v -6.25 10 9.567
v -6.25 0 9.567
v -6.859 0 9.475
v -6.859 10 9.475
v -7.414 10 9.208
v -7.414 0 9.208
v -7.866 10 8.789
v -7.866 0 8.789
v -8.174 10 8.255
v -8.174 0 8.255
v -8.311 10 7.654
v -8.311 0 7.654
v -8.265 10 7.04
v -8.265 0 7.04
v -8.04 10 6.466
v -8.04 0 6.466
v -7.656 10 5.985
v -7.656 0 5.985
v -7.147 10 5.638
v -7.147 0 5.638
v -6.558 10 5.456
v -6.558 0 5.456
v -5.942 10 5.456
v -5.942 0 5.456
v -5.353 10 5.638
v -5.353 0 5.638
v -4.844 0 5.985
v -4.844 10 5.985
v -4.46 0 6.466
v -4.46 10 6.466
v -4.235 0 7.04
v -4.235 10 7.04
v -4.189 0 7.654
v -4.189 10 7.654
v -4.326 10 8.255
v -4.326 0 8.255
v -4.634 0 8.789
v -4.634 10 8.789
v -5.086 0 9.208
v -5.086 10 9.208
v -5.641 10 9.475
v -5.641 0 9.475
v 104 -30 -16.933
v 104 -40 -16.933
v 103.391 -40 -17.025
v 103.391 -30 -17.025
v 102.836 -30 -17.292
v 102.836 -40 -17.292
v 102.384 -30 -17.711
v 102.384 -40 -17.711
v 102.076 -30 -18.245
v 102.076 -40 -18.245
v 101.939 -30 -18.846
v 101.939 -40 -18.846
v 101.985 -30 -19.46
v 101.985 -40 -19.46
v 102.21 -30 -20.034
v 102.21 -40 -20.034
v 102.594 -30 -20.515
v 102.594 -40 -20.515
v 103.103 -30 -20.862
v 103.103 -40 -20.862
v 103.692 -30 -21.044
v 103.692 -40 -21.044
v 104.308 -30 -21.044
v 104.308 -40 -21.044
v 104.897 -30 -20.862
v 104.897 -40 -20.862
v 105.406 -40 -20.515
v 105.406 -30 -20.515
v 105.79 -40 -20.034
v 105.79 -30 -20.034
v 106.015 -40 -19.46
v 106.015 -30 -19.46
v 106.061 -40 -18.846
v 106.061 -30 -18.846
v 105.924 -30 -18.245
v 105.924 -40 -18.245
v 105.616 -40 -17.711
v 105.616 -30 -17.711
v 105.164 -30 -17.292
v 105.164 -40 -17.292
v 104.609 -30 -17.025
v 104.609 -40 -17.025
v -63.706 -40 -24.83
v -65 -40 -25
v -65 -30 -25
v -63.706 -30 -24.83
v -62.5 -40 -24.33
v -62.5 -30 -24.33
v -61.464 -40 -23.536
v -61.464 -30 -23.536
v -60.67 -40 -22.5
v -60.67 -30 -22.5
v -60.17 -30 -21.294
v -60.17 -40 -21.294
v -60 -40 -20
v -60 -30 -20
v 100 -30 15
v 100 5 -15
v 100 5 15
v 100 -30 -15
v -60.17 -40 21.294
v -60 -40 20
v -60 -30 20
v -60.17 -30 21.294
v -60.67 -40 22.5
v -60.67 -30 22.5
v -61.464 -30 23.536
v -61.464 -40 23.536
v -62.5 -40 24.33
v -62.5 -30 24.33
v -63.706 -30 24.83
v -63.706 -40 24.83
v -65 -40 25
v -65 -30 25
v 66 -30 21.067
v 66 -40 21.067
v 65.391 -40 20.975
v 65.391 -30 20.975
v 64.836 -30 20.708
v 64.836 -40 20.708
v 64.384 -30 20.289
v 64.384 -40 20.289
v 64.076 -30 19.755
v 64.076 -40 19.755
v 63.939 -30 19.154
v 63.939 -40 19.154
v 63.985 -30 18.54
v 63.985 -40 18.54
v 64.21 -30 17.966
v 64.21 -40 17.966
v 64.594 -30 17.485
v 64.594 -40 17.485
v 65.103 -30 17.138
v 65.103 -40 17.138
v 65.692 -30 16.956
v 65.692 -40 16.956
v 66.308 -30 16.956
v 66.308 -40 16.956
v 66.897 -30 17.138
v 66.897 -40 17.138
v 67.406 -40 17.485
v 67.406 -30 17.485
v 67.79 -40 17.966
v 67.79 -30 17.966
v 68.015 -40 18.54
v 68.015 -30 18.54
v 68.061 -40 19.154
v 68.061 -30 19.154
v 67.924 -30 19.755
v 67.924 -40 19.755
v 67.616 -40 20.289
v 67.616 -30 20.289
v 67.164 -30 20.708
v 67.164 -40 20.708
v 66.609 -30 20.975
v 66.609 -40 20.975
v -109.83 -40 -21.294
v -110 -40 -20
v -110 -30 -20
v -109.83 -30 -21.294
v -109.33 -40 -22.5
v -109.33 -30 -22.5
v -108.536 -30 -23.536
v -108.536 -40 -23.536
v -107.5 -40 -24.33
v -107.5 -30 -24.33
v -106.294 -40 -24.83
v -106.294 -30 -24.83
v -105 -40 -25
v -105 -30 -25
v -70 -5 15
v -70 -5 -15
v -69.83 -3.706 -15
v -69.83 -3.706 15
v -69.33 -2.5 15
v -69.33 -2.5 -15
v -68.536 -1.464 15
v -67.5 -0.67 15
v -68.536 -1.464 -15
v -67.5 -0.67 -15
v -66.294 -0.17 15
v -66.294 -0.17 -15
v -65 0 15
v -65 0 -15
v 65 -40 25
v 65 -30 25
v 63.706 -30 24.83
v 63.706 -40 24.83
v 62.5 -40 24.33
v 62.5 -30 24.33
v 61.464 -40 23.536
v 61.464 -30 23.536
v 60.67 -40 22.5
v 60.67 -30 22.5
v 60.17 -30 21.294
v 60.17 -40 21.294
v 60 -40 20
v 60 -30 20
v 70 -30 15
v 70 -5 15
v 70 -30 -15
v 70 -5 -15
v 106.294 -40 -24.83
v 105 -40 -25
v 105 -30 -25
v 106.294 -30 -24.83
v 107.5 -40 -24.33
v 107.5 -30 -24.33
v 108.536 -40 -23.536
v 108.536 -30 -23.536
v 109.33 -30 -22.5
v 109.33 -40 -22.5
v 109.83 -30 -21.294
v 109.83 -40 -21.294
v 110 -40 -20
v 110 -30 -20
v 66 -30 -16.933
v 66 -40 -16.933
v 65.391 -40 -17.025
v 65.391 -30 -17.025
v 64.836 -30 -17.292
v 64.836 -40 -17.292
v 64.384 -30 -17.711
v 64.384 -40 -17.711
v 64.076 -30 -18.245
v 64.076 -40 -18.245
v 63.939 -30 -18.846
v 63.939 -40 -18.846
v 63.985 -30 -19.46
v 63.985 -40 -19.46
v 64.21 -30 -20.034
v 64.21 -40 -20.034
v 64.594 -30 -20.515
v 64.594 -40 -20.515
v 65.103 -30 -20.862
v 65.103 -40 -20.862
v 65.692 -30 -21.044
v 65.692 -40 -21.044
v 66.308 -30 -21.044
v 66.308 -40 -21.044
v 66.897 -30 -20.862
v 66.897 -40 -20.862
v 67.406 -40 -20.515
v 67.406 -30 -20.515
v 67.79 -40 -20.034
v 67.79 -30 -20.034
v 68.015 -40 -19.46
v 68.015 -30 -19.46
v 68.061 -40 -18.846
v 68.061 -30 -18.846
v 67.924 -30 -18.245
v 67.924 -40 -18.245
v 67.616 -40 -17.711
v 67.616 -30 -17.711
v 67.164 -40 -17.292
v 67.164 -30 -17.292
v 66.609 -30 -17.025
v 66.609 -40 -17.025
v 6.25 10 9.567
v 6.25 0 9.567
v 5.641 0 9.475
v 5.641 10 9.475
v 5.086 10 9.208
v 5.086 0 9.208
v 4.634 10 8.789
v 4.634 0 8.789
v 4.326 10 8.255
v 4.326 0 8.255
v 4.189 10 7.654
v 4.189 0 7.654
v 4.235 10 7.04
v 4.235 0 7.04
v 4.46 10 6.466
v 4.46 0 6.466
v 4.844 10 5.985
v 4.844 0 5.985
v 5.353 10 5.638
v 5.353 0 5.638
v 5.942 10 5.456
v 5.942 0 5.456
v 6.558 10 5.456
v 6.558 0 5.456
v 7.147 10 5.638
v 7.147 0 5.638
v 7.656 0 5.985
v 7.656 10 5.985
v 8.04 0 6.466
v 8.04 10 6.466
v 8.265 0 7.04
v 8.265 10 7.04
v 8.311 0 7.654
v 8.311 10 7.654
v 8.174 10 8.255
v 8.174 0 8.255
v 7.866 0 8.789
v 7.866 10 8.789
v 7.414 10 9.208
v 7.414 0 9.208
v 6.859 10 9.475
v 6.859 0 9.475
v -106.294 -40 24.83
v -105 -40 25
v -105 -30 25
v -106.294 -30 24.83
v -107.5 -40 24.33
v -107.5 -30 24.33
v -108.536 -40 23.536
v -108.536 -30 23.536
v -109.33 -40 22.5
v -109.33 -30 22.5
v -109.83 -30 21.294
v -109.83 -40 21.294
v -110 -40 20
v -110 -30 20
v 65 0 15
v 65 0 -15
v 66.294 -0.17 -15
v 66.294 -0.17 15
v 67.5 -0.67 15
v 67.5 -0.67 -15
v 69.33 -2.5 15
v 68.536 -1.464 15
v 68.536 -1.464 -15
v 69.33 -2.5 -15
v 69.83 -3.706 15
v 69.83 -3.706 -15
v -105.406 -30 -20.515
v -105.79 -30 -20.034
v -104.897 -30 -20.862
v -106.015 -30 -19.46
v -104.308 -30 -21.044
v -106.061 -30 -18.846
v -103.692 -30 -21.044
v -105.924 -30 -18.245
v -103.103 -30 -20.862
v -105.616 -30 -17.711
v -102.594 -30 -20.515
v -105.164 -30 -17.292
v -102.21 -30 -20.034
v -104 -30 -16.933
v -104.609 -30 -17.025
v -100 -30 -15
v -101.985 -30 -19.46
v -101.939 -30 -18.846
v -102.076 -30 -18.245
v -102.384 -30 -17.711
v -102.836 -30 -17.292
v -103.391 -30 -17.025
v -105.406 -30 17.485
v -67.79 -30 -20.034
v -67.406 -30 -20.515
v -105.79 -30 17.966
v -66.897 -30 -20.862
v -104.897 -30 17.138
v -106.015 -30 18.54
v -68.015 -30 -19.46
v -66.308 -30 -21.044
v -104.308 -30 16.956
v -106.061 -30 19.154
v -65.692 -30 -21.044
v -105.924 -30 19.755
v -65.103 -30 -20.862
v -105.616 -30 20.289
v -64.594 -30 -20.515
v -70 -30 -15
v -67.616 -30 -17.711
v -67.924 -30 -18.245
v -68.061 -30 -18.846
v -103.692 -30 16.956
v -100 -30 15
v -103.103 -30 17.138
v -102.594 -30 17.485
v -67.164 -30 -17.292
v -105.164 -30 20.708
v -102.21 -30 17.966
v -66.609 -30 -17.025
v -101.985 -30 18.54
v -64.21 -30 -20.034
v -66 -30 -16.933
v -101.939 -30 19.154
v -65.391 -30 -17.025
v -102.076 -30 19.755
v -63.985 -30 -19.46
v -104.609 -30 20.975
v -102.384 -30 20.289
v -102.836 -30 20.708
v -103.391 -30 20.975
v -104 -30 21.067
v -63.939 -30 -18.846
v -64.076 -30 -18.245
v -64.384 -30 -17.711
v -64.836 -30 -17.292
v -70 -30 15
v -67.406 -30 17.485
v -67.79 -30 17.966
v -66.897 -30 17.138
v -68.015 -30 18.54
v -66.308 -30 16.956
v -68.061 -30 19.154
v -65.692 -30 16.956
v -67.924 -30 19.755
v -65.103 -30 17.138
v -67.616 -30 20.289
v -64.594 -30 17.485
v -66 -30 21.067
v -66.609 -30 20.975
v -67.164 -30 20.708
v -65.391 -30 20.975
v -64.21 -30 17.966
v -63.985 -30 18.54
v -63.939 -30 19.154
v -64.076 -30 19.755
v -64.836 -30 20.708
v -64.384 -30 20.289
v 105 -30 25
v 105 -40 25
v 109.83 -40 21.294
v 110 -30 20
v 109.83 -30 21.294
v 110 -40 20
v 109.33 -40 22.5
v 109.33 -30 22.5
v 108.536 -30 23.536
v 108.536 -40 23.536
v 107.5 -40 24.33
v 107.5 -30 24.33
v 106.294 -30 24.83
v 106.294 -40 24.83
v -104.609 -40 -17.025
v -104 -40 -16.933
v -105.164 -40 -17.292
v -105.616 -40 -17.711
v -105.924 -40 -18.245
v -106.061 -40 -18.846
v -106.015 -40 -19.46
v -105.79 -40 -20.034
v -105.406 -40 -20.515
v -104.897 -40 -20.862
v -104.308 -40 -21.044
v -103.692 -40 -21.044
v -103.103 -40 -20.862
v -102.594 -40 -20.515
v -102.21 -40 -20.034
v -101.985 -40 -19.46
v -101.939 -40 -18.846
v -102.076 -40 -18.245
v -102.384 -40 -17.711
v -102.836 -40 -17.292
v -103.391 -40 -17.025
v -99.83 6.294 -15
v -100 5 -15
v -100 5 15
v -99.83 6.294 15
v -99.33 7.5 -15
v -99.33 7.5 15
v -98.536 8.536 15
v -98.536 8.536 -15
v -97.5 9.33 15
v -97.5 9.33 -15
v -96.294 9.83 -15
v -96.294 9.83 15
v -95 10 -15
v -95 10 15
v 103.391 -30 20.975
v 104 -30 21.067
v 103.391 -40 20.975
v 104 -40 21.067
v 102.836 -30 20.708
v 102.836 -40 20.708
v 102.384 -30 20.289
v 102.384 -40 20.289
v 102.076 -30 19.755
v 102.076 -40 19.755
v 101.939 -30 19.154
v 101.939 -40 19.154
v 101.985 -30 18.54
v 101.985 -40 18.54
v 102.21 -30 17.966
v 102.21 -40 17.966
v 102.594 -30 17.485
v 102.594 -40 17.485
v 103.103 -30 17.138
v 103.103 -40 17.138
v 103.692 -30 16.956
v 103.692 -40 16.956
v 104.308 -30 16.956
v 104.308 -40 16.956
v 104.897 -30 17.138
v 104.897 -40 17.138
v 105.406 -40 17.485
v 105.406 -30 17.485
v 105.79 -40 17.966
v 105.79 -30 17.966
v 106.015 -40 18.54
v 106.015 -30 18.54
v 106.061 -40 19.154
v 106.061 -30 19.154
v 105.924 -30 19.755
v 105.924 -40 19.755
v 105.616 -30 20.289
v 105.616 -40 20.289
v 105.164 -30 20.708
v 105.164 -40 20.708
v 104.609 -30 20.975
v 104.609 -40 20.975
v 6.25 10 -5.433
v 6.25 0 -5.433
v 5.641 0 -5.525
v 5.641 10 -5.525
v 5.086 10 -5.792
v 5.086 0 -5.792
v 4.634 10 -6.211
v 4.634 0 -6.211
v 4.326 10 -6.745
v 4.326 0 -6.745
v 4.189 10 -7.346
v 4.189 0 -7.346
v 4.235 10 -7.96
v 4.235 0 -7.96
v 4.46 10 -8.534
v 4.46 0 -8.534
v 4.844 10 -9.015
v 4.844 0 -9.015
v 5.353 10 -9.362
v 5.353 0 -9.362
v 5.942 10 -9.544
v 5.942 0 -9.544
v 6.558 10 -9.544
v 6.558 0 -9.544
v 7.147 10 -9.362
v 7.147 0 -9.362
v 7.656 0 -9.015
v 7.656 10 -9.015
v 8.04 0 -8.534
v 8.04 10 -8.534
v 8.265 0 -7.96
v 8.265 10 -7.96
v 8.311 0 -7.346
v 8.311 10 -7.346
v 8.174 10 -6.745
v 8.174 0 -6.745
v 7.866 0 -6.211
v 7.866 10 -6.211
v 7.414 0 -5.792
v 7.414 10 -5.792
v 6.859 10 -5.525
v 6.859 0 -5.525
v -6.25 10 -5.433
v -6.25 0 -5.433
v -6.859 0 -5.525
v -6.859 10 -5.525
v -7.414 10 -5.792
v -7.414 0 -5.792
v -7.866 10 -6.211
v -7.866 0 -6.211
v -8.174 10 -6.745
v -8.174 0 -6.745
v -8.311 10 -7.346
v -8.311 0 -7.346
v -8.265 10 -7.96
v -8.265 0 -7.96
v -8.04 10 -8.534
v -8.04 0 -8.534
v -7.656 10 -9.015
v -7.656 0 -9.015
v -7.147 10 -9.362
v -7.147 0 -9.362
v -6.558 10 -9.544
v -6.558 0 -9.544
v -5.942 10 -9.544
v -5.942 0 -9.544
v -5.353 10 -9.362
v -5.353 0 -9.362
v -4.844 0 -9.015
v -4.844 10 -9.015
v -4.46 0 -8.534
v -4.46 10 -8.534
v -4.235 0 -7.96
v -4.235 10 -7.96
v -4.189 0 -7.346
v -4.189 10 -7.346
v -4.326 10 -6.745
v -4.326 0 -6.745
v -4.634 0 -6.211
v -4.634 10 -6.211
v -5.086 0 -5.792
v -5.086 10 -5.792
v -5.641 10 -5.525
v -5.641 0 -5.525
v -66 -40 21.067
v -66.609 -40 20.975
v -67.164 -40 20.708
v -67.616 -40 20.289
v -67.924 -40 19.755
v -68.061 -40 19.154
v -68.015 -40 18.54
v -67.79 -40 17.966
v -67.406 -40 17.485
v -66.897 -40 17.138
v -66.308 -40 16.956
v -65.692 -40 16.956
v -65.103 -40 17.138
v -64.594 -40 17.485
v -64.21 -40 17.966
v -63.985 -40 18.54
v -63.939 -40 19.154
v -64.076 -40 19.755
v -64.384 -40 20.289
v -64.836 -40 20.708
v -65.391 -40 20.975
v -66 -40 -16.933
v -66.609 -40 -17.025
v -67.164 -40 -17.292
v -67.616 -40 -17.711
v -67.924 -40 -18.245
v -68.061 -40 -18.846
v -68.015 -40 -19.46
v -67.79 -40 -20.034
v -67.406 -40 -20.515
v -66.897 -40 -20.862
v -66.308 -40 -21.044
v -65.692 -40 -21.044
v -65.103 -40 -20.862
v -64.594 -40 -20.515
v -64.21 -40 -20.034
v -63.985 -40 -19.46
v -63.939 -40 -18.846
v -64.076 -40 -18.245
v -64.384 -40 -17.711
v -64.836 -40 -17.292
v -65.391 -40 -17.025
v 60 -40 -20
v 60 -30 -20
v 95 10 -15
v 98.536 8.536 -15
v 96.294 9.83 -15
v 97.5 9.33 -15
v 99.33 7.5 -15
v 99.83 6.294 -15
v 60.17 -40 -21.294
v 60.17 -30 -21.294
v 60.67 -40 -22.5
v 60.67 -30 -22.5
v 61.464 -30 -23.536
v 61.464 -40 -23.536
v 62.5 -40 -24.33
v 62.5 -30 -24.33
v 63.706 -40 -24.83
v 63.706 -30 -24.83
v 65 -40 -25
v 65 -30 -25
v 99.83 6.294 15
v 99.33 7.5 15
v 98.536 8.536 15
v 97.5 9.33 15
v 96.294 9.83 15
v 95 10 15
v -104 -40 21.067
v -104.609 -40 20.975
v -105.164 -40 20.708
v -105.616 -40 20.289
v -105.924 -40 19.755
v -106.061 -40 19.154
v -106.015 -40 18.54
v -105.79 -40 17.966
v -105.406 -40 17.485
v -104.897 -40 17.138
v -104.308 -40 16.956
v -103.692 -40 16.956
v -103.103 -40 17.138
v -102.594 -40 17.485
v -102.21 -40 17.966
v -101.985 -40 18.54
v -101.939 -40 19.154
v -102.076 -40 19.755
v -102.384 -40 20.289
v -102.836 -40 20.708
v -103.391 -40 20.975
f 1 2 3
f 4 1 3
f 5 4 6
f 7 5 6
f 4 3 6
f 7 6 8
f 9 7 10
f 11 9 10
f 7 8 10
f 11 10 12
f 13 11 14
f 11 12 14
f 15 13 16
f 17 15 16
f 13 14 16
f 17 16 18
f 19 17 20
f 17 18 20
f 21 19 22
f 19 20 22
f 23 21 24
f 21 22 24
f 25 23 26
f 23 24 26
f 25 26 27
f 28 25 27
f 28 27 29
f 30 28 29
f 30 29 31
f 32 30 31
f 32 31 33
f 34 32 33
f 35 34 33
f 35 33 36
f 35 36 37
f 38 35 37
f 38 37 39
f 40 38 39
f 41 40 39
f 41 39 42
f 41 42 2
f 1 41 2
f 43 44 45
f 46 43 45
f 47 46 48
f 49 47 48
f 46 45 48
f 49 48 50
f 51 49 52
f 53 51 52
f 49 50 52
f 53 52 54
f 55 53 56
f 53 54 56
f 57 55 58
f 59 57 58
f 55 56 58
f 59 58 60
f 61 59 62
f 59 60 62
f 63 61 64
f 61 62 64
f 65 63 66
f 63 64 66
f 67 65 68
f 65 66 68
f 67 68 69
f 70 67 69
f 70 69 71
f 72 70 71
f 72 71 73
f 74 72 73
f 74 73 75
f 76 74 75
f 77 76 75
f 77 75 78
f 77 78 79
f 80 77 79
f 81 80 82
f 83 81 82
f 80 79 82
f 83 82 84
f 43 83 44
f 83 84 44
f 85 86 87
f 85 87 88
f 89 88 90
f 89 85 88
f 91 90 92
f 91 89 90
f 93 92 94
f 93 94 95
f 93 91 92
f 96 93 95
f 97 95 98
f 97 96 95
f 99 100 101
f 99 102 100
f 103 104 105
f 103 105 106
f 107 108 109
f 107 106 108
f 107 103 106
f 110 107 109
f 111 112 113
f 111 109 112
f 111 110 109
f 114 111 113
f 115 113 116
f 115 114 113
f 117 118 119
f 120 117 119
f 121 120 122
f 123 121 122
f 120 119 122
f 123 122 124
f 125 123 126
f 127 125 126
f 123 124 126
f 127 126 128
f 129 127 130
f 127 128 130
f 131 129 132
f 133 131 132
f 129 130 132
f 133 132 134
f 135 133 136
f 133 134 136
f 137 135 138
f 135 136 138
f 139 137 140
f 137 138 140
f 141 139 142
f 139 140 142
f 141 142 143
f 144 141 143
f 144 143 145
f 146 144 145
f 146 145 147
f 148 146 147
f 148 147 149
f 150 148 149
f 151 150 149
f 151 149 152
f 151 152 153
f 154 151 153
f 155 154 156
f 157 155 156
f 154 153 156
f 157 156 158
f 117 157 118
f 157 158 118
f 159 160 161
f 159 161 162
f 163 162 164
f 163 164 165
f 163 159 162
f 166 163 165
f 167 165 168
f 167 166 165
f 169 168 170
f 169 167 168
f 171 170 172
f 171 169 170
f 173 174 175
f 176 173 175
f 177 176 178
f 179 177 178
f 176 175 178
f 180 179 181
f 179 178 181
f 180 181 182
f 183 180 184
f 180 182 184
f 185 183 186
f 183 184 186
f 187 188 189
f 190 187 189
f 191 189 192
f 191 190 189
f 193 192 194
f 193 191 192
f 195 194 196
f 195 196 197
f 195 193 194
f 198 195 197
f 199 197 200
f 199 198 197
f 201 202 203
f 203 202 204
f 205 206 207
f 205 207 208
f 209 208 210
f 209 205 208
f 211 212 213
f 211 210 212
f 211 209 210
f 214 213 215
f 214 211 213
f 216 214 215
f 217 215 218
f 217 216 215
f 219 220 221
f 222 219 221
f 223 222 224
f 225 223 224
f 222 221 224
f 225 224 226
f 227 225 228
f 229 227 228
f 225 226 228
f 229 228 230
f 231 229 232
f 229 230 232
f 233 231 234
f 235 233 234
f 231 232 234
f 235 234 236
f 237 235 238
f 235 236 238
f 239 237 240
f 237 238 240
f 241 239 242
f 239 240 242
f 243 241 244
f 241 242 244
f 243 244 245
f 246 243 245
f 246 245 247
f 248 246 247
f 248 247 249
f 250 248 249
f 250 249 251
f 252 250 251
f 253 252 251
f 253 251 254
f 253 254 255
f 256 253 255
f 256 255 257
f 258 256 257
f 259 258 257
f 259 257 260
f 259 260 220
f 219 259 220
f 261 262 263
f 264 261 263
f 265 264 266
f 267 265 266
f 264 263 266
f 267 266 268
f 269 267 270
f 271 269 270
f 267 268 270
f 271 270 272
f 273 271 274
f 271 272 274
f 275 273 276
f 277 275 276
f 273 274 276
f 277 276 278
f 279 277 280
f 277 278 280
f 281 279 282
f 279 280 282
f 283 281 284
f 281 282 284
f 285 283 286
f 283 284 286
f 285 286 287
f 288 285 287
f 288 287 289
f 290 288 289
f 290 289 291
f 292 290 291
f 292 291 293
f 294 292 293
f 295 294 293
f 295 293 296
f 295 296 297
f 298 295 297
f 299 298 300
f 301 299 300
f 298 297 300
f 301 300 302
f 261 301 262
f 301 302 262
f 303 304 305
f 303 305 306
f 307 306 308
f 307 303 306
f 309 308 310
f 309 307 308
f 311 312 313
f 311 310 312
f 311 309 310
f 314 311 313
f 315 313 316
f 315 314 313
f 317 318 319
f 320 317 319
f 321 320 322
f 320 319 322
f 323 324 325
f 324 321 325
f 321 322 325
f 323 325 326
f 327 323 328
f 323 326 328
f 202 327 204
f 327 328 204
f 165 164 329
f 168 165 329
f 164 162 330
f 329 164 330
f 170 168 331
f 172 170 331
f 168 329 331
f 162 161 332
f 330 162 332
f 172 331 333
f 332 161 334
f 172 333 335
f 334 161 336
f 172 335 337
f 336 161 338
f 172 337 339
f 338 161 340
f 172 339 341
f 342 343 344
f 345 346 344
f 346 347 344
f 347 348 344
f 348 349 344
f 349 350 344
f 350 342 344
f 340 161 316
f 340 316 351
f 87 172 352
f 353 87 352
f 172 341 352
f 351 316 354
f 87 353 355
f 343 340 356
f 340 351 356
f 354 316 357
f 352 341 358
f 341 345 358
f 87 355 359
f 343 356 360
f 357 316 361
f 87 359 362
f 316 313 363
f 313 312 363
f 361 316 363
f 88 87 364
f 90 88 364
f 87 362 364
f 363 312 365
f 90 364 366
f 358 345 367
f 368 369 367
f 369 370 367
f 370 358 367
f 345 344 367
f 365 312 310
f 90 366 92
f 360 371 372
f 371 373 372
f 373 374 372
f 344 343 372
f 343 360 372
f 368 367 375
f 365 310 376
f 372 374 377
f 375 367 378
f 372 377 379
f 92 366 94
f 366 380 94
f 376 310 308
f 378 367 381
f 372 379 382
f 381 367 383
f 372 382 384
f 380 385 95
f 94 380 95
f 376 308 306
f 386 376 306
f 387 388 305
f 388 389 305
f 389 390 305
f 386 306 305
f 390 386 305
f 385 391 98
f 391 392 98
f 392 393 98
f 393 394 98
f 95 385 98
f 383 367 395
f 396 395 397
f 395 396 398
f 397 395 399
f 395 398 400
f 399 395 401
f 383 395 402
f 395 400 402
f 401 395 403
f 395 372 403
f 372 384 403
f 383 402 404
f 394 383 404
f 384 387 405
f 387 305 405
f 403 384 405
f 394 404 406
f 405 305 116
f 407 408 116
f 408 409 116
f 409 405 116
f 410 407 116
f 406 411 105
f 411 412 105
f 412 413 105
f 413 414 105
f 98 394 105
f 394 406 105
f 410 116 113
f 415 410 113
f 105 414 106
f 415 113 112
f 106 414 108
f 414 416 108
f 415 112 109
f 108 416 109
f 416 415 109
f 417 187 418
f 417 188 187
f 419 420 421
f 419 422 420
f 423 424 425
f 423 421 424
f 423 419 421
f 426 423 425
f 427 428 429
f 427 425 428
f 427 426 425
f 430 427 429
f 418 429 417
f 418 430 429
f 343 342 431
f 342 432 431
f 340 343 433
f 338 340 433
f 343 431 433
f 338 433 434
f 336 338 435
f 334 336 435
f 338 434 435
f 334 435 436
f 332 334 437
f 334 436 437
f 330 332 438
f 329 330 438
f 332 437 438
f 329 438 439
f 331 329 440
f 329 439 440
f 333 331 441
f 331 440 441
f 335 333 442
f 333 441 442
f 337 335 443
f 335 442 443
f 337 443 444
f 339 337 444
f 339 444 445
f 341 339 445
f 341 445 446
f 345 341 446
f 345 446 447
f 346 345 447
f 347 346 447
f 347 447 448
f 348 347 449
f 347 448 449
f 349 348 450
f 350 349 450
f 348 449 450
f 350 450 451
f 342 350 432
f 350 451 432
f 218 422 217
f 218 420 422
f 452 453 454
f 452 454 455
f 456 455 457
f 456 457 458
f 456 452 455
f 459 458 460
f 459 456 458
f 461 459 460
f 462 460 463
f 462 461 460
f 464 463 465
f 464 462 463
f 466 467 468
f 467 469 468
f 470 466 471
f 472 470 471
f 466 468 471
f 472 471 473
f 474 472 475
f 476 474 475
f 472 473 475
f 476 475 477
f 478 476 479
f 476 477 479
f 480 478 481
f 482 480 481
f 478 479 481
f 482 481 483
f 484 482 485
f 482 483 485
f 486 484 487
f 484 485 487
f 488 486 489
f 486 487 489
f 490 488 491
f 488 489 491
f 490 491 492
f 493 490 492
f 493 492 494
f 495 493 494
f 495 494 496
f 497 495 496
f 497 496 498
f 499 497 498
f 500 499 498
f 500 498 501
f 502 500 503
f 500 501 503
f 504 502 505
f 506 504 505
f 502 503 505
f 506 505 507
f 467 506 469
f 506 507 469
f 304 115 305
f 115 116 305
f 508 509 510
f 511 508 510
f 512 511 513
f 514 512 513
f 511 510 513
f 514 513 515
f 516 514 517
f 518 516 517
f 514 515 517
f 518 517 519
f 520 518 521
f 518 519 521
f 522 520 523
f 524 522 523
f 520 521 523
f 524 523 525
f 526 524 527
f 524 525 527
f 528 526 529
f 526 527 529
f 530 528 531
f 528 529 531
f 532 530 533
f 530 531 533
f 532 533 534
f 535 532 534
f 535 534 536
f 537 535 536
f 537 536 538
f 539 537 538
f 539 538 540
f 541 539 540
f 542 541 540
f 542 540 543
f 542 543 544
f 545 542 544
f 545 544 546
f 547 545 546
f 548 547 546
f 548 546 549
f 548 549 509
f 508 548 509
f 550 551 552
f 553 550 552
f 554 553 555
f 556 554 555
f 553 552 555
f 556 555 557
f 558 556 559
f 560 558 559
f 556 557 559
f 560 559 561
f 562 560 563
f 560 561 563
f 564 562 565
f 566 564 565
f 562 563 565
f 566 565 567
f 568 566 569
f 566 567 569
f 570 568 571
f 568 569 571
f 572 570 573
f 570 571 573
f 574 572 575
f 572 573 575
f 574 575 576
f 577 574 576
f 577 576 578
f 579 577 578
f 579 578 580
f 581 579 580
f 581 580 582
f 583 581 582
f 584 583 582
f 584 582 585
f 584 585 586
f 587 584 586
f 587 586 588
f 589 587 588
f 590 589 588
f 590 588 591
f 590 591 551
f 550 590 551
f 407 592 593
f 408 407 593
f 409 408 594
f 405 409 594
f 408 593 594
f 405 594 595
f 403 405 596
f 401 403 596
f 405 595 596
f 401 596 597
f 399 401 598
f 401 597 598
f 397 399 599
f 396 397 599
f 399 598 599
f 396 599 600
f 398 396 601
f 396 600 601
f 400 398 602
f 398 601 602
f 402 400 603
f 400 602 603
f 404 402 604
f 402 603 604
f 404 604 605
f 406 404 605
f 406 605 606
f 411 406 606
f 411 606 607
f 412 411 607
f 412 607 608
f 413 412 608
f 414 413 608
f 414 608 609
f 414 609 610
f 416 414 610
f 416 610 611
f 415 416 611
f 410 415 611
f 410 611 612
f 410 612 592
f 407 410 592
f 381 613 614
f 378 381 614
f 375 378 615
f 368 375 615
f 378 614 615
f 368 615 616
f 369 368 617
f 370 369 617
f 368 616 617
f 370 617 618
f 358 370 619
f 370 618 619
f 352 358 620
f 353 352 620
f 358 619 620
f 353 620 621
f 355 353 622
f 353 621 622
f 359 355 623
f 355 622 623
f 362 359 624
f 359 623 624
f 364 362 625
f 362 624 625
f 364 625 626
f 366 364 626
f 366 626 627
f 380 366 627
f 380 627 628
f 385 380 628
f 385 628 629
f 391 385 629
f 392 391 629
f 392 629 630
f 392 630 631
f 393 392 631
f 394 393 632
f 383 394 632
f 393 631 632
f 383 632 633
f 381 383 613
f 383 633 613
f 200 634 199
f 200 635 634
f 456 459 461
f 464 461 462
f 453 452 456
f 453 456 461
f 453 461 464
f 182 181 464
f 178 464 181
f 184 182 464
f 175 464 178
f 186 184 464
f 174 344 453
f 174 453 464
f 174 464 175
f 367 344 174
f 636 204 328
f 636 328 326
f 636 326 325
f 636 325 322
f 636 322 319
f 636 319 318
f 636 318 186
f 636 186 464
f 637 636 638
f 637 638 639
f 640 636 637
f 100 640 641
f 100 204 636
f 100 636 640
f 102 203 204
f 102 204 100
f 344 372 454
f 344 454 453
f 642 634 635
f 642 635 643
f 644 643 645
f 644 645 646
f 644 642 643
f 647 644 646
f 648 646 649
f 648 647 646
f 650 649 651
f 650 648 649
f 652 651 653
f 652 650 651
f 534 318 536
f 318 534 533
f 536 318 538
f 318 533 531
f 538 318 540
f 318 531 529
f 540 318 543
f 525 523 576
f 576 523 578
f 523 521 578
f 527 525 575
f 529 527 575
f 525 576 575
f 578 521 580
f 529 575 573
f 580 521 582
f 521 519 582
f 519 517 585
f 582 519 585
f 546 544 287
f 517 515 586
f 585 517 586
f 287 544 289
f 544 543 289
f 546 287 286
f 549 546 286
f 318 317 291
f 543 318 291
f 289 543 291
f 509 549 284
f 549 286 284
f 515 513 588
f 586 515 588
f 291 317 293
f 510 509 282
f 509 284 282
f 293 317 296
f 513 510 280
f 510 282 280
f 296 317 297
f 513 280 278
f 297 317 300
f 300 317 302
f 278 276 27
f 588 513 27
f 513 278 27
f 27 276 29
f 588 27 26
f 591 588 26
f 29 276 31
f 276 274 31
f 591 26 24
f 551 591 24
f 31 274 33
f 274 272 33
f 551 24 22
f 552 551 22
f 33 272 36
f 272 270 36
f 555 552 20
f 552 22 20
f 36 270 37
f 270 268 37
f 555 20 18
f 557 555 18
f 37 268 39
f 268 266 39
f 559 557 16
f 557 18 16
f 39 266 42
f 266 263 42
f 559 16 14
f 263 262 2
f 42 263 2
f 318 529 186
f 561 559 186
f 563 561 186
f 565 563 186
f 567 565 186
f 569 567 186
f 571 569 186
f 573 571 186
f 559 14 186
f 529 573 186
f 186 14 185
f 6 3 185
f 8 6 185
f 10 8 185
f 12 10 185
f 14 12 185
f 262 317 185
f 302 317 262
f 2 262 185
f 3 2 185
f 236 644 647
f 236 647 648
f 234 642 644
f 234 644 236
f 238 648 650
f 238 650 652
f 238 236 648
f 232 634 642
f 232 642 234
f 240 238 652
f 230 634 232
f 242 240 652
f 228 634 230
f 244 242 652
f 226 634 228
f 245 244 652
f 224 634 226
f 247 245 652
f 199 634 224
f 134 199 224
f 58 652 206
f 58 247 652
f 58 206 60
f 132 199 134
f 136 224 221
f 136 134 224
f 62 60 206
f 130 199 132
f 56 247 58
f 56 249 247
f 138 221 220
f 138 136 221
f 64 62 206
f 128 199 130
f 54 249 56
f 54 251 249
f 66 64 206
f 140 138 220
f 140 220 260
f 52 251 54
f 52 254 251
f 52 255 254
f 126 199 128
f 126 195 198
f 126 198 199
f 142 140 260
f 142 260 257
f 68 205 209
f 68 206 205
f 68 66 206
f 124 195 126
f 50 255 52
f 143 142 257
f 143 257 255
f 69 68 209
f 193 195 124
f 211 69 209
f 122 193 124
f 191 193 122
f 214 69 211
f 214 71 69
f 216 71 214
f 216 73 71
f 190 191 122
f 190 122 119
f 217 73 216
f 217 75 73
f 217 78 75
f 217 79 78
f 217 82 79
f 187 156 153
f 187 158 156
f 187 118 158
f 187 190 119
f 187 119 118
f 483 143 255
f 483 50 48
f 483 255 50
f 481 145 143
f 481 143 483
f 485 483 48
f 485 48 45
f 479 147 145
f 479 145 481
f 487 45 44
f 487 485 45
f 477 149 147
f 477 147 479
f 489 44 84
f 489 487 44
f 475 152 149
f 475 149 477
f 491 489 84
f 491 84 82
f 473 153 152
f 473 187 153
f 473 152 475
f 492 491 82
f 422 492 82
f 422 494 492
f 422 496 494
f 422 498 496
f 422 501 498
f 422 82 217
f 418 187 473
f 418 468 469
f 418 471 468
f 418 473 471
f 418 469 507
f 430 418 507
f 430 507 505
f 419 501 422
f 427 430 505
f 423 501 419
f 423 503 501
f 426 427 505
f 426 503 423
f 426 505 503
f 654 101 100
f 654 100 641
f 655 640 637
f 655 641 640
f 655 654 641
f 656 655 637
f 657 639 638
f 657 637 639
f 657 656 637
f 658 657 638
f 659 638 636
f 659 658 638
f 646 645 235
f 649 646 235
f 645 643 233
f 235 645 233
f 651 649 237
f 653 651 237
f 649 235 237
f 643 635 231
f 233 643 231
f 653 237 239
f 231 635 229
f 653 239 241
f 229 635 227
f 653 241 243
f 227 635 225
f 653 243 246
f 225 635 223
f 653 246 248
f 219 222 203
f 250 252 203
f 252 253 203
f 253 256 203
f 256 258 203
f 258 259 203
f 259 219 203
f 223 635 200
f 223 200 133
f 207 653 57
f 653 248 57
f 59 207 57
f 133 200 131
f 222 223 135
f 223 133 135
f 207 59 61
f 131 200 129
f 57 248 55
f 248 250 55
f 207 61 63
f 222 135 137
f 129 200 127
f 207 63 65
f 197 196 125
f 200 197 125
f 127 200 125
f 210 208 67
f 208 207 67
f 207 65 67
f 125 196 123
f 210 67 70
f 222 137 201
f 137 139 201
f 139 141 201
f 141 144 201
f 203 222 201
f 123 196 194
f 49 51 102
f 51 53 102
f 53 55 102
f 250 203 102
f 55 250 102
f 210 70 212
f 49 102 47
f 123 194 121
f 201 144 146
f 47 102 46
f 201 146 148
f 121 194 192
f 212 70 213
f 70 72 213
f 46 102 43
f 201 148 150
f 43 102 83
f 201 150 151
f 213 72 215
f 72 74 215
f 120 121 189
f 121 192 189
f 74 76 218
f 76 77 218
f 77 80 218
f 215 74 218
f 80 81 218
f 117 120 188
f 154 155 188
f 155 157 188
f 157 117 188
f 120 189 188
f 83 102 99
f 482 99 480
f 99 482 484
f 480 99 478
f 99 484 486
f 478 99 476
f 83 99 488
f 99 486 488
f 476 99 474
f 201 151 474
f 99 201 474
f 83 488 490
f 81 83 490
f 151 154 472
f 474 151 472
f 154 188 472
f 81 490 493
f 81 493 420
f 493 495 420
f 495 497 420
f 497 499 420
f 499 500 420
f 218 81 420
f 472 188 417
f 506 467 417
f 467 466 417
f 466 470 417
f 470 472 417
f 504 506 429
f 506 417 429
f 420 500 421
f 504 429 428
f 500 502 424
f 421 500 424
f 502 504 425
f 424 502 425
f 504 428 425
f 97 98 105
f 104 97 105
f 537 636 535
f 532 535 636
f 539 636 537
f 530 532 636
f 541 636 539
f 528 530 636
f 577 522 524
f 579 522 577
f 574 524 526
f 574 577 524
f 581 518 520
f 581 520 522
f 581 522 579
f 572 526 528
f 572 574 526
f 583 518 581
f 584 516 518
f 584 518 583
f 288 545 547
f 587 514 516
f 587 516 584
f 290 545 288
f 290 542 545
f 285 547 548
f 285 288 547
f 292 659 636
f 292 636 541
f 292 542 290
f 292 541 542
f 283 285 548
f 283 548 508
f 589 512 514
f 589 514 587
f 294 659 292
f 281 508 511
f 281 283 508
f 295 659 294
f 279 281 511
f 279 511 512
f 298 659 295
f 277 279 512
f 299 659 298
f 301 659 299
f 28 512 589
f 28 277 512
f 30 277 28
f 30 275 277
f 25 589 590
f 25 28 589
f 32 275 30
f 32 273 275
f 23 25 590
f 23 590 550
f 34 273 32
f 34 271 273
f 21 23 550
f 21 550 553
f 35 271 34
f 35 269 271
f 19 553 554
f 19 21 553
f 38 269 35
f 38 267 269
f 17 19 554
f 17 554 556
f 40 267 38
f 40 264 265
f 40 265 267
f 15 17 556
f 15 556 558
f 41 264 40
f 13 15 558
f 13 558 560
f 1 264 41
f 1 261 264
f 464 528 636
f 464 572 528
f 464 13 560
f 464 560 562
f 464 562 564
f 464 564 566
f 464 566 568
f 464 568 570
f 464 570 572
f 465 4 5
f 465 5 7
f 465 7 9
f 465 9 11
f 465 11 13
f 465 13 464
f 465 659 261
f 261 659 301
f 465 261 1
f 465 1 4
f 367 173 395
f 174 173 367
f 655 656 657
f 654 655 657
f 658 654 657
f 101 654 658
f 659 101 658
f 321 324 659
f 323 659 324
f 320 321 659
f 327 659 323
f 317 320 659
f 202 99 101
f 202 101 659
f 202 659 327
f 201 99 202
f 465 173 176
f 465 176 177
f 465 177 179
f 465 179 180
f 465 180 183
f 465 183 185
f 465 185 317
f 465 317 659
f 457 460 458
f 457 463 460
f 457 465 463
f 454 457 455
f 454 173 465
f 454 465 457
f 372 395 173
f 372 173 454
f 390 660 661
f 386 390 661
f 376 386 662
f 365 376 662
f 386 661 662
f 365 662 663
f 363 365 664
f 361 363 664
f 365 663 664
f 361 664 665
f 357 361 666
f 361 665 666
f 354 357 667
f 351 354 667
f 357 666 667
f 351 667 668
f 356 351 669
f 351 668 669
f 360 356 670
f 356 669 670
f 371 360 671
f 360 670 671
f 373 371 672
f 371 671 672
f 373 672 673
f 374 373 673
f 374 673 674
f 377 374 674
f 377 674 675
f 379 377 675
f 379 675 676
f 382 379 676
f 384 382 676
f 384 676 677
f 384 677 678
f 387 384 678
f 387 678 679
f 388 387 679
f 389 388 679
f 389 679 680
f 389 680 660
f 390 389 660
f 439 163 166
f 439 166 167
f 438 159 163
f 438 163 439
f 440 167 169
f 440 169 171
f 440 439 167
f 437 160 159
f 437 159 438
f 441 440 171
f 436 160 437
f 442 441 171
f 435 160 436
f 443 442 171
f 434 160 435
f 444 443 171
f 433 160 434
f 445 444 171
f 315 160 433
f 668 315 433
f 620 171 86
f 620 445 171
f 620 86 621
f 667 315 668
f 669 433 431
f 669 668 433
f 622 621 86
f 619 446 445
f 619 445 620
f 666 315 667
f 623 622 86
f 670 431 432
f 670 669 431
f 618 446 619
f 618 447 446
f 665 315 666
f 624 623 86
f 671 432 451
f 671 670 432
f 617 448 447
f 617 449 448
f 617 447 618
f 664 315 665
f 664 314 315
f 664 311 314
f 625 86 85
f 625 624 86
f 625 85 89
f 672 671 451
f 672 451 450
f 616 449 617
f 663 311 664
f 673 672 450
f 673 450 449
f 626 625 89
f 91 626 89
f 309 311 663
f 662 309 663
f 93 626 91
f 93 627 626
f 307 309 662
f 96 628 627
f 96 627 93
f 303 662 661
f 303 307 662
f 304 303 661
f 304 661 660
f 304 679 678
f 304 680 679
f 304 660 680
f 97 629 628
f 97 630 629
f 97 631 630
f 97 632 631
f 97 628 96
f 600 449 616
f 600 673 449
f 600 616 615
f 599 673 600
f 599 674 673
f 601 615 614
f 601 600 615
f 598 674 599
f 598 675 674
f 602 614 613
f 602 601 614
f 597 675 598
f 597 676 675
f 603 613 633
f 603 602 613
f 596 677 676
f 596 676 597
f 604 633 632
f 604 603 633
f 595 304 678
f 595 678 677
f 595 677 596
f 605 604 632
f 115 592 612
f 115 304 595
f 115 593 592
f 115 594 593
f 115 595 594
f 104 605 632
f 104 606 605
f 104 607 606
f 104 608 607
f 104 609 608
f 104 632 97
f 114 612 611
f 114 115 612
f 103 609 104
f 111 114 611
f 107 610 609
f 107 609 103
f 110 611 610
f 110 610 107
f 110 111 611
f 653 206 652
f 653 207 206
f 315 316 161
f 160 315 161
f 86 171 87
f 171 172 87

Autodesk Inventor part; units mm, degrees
ref_plane "YZ Plane" through (0, 0, 0) normal (1, 0, 0) x (0, 1, 0)
ref_plane "XZ Plane" through (0, 0, 0) normal (0, 1, 0) x (-1, 0, 0)
ref_plane "XY Plane" through (0, 0, 0) normal (0, 0, 1) x (1, 0, 0)
sketch "Skizze1" plane through (0, 0, 0) normal (0, 1, 0) x (-1, 0, 0)
  line L0 (-100, 15) -> (100, 15)
  line L1 (100, 15) -> (100, -15)
  line L2 (100, -15) -> (-100, -15)
  line L3 (-100, -15) -> (-100, 15)
  line L4 (-100, 15) -> (100, -15) construction
  line L5 (100, 15) -> (-100, -15) construction
  point P0 (0, 0)
  dimension "d0" = 30
  dimension "d1" = 200
extrude "Extrusion1" add sketch "Skizze1" along normal blind 10
sketch "Skizze4" plane through (0, 10, 0) normal (0, 1, 0) x (1, 0, 0)
  line L0 (100, 15) -> (-100, 15) projected
  line L1 (100, -15) -> (100, 15) projected
  line L2 (-100, -15) -> (100, -15) projected
  line L3 (-100, 15) -> (-100, -15) projected
  line L4 (0, 21) -> (0, -21) projected
  point P0 (0, 0)
  point P1 (6.25, 7.5)
  point P2 (6.25, -7.5)
  point P3 (-6.25, -7.5)
  point P4 (-6.25, 7.5)
  dimension "d37" = 7.5
  dimension "d40" = 7.5
  dimension "d41" = 7.5
  dimension "d44" = 7.5
  dimension "d52" = 6.25
  dimension "d53" = 6.25
  dimension "d54" = 6.25
  dimension "d55" = 6.25
hole "Bohrung3" at (6.25, 10, -7.5) at (6.25, 10, 7.5) at (-6.25, 10, 7.5) at (-6.25, 10, -7.5) direction (0, -1, 0) diameter 4.134 depth 14.2 thread size "M5x0.8" class "6H" standard "ANSI Metric M Profile"
sketch "Skizze5" plane through (0, 0, 0) normal (0, -1, 0) x (1, 0, 0)
  line L0 (-100, 15) -> (100, 15) projected
  line L1 (-70, -15) -> (-100, -15)
  line L2 (-100, -15) -> (-100, 15)
  line L3 (-100, 15) -> (-70, 15)
  line L4 (-70, 15) -> (-70, -15)
  line L5 (-70, -15) -> (-100, 15) construction
  line L6 (-100, -15) -> (-70, 15) construction
  line L7 (-100, -15) -> (-100, 15) projected
  line L8 (100, -15) -> (-100, -15) projected
  line L9 (70, -15) -> (100, -15)
  line L10 (100, -15) -> (100, 15)
  line L11 (100, 15) -> (70, 15)
  line L12 (70, 15) -> (70, -15)
  line L13 (70, -15) -> (100, 15) construction
  line L14 (100, -15) -> (70, 15) construction
  line L15 (100, 15) -> (100, -15) projected
  point P0 (0, 0)
  point P1 (-12.5, 15)
  point P2 (-85, 0)
  point P3 (-12.5, -15)
  point P4 (85, 0)
  dimension "d56" = 0
  dimension "d57" = 0
  dimension "d58" = 30
  dimension "d59" = 30
  dimension "d60" = 30
  dimension "d61" = 0
extrude "Extrusion3" add sketch "Skizze5" along normal blind 30 contours L0 L4 L1 L2 | L0 L10 L8 L12
sketch "Skizze6" plane through (0, -30, 0) normal (0, -1, 0) x (1, 0, 0)
  line L0 (-110, -25) -> (-60, -25)
  line L1 (-60, -25) -> (-60, 25)
  line L2 (-60, 25) -> (-110, 25)
  line L3 (-110, 25) -> (-110, -25)
  line L4 (-110, -25) -> (-60, 25) construction
  line L5 (-60, -25) -> (-110, 25) construction
  line L6 (-70, -15) -> (-70, 15) projected
  line L7 (60, 25) -> (110, 25)
  line L8 (110, 25) -> (110, -25)
  line L9 (110, -25) -> (60, -25)
  line L10 (60, -25) -> (60, 25)
  line L11 (60, 25) -> (110, -25) construction
  line L12 (110, 25) -> (60, -25) construction
  line L13 (100, -15) -> (100, 15) projected
  point P0 (0, 0)
  point P1 (-85, 0)
  point P2 (85, 0)
  dimension "d64" = 15
  dimension "d65" = 50
  dimension "d66" = 50
  dimension "d67" = 15
  dimension "d86" = 50
  dimension "d87" = 50
extrude "Extrusion4" add sketch "Skizze6" along normal blind 10
fillet "Rundung1" radius 5 8 edges at (-110, -35, 25) (-60, -35, 25) (-110, -35, -25) (-60, -35, -25) (60, -35, -25) (110, -35, -25) (110, -35, 25) (60, -35, 25)
sketch "Skizze7" plane through (0, -30, 0) normal (0, 1, 0) x (1, 0, 0)
  line L0 (110, 20) -> (110, -20) projected
  line L1 (105, -25) -> (65, -25) projected
  line L2 (60, -20) -> (60, 20) projected
  line L3 (65, 25) -> (105, 25) projected
  line L4 (-60, 20) -> (-60, -20) projected
  line L5 (-65, -25) -> (-105, -25) projected
  line L6 (-110, -20) -> (-110, 20) projected
  line L7 (-105, 25) -> (-65, 25) projected
  point P0 (0, 0)
  point P1 (104, -19)
  point P2 (66, -19)
  point P3 (66, 19)
  point P4 (104, 19)
  point P5 (-66, -19)
  point P6 (-104, -19)
  point P7 (-104, 19)
  point P8 (-66, 19)
  dimension "d71" = 6
  dimension "d72" = 6
  dimension "d73" = 6
  dimension "d74" = 6
  dimension "d75" = 6
  dimension "d76" = 6
  dimension "d77" = 6
  dimension "d78" = 6
  dimension "d79" = 6
  dimension "d80" = 6
  dimension "d81" = 6
  dimension "d82" = 6
  dimension "d83" = 6
  dimension "d84" = 6
  dimension "d85" = 6
  dimension "d95" = 6
hole "Bohrung4" at (-66, -30, 19) at (104, -30, 19) at (104, -30, -19) at (66, -30, -19) at (66, -30, 19) at (-104, -30, 19) at (-66, -30, -19) at (-104, -30, -19) direction (0, -1, 0) diameter 4.134 depth 14.2 thread size "M5x0.8" class "6H" standard "ANSI Metric M Profile"
fillet "Rundung2" radius 5 4 edges at (100, 10, 0) (-100, 10, 0) (70, 0, 0) (-70, 0, 0)
equation "\"d46\" = d42"
equation "\"d89\" = d83"
equation "\"d42\" = 6.5"
properties part number "Platte für Gehäuse" material "Stahl"
